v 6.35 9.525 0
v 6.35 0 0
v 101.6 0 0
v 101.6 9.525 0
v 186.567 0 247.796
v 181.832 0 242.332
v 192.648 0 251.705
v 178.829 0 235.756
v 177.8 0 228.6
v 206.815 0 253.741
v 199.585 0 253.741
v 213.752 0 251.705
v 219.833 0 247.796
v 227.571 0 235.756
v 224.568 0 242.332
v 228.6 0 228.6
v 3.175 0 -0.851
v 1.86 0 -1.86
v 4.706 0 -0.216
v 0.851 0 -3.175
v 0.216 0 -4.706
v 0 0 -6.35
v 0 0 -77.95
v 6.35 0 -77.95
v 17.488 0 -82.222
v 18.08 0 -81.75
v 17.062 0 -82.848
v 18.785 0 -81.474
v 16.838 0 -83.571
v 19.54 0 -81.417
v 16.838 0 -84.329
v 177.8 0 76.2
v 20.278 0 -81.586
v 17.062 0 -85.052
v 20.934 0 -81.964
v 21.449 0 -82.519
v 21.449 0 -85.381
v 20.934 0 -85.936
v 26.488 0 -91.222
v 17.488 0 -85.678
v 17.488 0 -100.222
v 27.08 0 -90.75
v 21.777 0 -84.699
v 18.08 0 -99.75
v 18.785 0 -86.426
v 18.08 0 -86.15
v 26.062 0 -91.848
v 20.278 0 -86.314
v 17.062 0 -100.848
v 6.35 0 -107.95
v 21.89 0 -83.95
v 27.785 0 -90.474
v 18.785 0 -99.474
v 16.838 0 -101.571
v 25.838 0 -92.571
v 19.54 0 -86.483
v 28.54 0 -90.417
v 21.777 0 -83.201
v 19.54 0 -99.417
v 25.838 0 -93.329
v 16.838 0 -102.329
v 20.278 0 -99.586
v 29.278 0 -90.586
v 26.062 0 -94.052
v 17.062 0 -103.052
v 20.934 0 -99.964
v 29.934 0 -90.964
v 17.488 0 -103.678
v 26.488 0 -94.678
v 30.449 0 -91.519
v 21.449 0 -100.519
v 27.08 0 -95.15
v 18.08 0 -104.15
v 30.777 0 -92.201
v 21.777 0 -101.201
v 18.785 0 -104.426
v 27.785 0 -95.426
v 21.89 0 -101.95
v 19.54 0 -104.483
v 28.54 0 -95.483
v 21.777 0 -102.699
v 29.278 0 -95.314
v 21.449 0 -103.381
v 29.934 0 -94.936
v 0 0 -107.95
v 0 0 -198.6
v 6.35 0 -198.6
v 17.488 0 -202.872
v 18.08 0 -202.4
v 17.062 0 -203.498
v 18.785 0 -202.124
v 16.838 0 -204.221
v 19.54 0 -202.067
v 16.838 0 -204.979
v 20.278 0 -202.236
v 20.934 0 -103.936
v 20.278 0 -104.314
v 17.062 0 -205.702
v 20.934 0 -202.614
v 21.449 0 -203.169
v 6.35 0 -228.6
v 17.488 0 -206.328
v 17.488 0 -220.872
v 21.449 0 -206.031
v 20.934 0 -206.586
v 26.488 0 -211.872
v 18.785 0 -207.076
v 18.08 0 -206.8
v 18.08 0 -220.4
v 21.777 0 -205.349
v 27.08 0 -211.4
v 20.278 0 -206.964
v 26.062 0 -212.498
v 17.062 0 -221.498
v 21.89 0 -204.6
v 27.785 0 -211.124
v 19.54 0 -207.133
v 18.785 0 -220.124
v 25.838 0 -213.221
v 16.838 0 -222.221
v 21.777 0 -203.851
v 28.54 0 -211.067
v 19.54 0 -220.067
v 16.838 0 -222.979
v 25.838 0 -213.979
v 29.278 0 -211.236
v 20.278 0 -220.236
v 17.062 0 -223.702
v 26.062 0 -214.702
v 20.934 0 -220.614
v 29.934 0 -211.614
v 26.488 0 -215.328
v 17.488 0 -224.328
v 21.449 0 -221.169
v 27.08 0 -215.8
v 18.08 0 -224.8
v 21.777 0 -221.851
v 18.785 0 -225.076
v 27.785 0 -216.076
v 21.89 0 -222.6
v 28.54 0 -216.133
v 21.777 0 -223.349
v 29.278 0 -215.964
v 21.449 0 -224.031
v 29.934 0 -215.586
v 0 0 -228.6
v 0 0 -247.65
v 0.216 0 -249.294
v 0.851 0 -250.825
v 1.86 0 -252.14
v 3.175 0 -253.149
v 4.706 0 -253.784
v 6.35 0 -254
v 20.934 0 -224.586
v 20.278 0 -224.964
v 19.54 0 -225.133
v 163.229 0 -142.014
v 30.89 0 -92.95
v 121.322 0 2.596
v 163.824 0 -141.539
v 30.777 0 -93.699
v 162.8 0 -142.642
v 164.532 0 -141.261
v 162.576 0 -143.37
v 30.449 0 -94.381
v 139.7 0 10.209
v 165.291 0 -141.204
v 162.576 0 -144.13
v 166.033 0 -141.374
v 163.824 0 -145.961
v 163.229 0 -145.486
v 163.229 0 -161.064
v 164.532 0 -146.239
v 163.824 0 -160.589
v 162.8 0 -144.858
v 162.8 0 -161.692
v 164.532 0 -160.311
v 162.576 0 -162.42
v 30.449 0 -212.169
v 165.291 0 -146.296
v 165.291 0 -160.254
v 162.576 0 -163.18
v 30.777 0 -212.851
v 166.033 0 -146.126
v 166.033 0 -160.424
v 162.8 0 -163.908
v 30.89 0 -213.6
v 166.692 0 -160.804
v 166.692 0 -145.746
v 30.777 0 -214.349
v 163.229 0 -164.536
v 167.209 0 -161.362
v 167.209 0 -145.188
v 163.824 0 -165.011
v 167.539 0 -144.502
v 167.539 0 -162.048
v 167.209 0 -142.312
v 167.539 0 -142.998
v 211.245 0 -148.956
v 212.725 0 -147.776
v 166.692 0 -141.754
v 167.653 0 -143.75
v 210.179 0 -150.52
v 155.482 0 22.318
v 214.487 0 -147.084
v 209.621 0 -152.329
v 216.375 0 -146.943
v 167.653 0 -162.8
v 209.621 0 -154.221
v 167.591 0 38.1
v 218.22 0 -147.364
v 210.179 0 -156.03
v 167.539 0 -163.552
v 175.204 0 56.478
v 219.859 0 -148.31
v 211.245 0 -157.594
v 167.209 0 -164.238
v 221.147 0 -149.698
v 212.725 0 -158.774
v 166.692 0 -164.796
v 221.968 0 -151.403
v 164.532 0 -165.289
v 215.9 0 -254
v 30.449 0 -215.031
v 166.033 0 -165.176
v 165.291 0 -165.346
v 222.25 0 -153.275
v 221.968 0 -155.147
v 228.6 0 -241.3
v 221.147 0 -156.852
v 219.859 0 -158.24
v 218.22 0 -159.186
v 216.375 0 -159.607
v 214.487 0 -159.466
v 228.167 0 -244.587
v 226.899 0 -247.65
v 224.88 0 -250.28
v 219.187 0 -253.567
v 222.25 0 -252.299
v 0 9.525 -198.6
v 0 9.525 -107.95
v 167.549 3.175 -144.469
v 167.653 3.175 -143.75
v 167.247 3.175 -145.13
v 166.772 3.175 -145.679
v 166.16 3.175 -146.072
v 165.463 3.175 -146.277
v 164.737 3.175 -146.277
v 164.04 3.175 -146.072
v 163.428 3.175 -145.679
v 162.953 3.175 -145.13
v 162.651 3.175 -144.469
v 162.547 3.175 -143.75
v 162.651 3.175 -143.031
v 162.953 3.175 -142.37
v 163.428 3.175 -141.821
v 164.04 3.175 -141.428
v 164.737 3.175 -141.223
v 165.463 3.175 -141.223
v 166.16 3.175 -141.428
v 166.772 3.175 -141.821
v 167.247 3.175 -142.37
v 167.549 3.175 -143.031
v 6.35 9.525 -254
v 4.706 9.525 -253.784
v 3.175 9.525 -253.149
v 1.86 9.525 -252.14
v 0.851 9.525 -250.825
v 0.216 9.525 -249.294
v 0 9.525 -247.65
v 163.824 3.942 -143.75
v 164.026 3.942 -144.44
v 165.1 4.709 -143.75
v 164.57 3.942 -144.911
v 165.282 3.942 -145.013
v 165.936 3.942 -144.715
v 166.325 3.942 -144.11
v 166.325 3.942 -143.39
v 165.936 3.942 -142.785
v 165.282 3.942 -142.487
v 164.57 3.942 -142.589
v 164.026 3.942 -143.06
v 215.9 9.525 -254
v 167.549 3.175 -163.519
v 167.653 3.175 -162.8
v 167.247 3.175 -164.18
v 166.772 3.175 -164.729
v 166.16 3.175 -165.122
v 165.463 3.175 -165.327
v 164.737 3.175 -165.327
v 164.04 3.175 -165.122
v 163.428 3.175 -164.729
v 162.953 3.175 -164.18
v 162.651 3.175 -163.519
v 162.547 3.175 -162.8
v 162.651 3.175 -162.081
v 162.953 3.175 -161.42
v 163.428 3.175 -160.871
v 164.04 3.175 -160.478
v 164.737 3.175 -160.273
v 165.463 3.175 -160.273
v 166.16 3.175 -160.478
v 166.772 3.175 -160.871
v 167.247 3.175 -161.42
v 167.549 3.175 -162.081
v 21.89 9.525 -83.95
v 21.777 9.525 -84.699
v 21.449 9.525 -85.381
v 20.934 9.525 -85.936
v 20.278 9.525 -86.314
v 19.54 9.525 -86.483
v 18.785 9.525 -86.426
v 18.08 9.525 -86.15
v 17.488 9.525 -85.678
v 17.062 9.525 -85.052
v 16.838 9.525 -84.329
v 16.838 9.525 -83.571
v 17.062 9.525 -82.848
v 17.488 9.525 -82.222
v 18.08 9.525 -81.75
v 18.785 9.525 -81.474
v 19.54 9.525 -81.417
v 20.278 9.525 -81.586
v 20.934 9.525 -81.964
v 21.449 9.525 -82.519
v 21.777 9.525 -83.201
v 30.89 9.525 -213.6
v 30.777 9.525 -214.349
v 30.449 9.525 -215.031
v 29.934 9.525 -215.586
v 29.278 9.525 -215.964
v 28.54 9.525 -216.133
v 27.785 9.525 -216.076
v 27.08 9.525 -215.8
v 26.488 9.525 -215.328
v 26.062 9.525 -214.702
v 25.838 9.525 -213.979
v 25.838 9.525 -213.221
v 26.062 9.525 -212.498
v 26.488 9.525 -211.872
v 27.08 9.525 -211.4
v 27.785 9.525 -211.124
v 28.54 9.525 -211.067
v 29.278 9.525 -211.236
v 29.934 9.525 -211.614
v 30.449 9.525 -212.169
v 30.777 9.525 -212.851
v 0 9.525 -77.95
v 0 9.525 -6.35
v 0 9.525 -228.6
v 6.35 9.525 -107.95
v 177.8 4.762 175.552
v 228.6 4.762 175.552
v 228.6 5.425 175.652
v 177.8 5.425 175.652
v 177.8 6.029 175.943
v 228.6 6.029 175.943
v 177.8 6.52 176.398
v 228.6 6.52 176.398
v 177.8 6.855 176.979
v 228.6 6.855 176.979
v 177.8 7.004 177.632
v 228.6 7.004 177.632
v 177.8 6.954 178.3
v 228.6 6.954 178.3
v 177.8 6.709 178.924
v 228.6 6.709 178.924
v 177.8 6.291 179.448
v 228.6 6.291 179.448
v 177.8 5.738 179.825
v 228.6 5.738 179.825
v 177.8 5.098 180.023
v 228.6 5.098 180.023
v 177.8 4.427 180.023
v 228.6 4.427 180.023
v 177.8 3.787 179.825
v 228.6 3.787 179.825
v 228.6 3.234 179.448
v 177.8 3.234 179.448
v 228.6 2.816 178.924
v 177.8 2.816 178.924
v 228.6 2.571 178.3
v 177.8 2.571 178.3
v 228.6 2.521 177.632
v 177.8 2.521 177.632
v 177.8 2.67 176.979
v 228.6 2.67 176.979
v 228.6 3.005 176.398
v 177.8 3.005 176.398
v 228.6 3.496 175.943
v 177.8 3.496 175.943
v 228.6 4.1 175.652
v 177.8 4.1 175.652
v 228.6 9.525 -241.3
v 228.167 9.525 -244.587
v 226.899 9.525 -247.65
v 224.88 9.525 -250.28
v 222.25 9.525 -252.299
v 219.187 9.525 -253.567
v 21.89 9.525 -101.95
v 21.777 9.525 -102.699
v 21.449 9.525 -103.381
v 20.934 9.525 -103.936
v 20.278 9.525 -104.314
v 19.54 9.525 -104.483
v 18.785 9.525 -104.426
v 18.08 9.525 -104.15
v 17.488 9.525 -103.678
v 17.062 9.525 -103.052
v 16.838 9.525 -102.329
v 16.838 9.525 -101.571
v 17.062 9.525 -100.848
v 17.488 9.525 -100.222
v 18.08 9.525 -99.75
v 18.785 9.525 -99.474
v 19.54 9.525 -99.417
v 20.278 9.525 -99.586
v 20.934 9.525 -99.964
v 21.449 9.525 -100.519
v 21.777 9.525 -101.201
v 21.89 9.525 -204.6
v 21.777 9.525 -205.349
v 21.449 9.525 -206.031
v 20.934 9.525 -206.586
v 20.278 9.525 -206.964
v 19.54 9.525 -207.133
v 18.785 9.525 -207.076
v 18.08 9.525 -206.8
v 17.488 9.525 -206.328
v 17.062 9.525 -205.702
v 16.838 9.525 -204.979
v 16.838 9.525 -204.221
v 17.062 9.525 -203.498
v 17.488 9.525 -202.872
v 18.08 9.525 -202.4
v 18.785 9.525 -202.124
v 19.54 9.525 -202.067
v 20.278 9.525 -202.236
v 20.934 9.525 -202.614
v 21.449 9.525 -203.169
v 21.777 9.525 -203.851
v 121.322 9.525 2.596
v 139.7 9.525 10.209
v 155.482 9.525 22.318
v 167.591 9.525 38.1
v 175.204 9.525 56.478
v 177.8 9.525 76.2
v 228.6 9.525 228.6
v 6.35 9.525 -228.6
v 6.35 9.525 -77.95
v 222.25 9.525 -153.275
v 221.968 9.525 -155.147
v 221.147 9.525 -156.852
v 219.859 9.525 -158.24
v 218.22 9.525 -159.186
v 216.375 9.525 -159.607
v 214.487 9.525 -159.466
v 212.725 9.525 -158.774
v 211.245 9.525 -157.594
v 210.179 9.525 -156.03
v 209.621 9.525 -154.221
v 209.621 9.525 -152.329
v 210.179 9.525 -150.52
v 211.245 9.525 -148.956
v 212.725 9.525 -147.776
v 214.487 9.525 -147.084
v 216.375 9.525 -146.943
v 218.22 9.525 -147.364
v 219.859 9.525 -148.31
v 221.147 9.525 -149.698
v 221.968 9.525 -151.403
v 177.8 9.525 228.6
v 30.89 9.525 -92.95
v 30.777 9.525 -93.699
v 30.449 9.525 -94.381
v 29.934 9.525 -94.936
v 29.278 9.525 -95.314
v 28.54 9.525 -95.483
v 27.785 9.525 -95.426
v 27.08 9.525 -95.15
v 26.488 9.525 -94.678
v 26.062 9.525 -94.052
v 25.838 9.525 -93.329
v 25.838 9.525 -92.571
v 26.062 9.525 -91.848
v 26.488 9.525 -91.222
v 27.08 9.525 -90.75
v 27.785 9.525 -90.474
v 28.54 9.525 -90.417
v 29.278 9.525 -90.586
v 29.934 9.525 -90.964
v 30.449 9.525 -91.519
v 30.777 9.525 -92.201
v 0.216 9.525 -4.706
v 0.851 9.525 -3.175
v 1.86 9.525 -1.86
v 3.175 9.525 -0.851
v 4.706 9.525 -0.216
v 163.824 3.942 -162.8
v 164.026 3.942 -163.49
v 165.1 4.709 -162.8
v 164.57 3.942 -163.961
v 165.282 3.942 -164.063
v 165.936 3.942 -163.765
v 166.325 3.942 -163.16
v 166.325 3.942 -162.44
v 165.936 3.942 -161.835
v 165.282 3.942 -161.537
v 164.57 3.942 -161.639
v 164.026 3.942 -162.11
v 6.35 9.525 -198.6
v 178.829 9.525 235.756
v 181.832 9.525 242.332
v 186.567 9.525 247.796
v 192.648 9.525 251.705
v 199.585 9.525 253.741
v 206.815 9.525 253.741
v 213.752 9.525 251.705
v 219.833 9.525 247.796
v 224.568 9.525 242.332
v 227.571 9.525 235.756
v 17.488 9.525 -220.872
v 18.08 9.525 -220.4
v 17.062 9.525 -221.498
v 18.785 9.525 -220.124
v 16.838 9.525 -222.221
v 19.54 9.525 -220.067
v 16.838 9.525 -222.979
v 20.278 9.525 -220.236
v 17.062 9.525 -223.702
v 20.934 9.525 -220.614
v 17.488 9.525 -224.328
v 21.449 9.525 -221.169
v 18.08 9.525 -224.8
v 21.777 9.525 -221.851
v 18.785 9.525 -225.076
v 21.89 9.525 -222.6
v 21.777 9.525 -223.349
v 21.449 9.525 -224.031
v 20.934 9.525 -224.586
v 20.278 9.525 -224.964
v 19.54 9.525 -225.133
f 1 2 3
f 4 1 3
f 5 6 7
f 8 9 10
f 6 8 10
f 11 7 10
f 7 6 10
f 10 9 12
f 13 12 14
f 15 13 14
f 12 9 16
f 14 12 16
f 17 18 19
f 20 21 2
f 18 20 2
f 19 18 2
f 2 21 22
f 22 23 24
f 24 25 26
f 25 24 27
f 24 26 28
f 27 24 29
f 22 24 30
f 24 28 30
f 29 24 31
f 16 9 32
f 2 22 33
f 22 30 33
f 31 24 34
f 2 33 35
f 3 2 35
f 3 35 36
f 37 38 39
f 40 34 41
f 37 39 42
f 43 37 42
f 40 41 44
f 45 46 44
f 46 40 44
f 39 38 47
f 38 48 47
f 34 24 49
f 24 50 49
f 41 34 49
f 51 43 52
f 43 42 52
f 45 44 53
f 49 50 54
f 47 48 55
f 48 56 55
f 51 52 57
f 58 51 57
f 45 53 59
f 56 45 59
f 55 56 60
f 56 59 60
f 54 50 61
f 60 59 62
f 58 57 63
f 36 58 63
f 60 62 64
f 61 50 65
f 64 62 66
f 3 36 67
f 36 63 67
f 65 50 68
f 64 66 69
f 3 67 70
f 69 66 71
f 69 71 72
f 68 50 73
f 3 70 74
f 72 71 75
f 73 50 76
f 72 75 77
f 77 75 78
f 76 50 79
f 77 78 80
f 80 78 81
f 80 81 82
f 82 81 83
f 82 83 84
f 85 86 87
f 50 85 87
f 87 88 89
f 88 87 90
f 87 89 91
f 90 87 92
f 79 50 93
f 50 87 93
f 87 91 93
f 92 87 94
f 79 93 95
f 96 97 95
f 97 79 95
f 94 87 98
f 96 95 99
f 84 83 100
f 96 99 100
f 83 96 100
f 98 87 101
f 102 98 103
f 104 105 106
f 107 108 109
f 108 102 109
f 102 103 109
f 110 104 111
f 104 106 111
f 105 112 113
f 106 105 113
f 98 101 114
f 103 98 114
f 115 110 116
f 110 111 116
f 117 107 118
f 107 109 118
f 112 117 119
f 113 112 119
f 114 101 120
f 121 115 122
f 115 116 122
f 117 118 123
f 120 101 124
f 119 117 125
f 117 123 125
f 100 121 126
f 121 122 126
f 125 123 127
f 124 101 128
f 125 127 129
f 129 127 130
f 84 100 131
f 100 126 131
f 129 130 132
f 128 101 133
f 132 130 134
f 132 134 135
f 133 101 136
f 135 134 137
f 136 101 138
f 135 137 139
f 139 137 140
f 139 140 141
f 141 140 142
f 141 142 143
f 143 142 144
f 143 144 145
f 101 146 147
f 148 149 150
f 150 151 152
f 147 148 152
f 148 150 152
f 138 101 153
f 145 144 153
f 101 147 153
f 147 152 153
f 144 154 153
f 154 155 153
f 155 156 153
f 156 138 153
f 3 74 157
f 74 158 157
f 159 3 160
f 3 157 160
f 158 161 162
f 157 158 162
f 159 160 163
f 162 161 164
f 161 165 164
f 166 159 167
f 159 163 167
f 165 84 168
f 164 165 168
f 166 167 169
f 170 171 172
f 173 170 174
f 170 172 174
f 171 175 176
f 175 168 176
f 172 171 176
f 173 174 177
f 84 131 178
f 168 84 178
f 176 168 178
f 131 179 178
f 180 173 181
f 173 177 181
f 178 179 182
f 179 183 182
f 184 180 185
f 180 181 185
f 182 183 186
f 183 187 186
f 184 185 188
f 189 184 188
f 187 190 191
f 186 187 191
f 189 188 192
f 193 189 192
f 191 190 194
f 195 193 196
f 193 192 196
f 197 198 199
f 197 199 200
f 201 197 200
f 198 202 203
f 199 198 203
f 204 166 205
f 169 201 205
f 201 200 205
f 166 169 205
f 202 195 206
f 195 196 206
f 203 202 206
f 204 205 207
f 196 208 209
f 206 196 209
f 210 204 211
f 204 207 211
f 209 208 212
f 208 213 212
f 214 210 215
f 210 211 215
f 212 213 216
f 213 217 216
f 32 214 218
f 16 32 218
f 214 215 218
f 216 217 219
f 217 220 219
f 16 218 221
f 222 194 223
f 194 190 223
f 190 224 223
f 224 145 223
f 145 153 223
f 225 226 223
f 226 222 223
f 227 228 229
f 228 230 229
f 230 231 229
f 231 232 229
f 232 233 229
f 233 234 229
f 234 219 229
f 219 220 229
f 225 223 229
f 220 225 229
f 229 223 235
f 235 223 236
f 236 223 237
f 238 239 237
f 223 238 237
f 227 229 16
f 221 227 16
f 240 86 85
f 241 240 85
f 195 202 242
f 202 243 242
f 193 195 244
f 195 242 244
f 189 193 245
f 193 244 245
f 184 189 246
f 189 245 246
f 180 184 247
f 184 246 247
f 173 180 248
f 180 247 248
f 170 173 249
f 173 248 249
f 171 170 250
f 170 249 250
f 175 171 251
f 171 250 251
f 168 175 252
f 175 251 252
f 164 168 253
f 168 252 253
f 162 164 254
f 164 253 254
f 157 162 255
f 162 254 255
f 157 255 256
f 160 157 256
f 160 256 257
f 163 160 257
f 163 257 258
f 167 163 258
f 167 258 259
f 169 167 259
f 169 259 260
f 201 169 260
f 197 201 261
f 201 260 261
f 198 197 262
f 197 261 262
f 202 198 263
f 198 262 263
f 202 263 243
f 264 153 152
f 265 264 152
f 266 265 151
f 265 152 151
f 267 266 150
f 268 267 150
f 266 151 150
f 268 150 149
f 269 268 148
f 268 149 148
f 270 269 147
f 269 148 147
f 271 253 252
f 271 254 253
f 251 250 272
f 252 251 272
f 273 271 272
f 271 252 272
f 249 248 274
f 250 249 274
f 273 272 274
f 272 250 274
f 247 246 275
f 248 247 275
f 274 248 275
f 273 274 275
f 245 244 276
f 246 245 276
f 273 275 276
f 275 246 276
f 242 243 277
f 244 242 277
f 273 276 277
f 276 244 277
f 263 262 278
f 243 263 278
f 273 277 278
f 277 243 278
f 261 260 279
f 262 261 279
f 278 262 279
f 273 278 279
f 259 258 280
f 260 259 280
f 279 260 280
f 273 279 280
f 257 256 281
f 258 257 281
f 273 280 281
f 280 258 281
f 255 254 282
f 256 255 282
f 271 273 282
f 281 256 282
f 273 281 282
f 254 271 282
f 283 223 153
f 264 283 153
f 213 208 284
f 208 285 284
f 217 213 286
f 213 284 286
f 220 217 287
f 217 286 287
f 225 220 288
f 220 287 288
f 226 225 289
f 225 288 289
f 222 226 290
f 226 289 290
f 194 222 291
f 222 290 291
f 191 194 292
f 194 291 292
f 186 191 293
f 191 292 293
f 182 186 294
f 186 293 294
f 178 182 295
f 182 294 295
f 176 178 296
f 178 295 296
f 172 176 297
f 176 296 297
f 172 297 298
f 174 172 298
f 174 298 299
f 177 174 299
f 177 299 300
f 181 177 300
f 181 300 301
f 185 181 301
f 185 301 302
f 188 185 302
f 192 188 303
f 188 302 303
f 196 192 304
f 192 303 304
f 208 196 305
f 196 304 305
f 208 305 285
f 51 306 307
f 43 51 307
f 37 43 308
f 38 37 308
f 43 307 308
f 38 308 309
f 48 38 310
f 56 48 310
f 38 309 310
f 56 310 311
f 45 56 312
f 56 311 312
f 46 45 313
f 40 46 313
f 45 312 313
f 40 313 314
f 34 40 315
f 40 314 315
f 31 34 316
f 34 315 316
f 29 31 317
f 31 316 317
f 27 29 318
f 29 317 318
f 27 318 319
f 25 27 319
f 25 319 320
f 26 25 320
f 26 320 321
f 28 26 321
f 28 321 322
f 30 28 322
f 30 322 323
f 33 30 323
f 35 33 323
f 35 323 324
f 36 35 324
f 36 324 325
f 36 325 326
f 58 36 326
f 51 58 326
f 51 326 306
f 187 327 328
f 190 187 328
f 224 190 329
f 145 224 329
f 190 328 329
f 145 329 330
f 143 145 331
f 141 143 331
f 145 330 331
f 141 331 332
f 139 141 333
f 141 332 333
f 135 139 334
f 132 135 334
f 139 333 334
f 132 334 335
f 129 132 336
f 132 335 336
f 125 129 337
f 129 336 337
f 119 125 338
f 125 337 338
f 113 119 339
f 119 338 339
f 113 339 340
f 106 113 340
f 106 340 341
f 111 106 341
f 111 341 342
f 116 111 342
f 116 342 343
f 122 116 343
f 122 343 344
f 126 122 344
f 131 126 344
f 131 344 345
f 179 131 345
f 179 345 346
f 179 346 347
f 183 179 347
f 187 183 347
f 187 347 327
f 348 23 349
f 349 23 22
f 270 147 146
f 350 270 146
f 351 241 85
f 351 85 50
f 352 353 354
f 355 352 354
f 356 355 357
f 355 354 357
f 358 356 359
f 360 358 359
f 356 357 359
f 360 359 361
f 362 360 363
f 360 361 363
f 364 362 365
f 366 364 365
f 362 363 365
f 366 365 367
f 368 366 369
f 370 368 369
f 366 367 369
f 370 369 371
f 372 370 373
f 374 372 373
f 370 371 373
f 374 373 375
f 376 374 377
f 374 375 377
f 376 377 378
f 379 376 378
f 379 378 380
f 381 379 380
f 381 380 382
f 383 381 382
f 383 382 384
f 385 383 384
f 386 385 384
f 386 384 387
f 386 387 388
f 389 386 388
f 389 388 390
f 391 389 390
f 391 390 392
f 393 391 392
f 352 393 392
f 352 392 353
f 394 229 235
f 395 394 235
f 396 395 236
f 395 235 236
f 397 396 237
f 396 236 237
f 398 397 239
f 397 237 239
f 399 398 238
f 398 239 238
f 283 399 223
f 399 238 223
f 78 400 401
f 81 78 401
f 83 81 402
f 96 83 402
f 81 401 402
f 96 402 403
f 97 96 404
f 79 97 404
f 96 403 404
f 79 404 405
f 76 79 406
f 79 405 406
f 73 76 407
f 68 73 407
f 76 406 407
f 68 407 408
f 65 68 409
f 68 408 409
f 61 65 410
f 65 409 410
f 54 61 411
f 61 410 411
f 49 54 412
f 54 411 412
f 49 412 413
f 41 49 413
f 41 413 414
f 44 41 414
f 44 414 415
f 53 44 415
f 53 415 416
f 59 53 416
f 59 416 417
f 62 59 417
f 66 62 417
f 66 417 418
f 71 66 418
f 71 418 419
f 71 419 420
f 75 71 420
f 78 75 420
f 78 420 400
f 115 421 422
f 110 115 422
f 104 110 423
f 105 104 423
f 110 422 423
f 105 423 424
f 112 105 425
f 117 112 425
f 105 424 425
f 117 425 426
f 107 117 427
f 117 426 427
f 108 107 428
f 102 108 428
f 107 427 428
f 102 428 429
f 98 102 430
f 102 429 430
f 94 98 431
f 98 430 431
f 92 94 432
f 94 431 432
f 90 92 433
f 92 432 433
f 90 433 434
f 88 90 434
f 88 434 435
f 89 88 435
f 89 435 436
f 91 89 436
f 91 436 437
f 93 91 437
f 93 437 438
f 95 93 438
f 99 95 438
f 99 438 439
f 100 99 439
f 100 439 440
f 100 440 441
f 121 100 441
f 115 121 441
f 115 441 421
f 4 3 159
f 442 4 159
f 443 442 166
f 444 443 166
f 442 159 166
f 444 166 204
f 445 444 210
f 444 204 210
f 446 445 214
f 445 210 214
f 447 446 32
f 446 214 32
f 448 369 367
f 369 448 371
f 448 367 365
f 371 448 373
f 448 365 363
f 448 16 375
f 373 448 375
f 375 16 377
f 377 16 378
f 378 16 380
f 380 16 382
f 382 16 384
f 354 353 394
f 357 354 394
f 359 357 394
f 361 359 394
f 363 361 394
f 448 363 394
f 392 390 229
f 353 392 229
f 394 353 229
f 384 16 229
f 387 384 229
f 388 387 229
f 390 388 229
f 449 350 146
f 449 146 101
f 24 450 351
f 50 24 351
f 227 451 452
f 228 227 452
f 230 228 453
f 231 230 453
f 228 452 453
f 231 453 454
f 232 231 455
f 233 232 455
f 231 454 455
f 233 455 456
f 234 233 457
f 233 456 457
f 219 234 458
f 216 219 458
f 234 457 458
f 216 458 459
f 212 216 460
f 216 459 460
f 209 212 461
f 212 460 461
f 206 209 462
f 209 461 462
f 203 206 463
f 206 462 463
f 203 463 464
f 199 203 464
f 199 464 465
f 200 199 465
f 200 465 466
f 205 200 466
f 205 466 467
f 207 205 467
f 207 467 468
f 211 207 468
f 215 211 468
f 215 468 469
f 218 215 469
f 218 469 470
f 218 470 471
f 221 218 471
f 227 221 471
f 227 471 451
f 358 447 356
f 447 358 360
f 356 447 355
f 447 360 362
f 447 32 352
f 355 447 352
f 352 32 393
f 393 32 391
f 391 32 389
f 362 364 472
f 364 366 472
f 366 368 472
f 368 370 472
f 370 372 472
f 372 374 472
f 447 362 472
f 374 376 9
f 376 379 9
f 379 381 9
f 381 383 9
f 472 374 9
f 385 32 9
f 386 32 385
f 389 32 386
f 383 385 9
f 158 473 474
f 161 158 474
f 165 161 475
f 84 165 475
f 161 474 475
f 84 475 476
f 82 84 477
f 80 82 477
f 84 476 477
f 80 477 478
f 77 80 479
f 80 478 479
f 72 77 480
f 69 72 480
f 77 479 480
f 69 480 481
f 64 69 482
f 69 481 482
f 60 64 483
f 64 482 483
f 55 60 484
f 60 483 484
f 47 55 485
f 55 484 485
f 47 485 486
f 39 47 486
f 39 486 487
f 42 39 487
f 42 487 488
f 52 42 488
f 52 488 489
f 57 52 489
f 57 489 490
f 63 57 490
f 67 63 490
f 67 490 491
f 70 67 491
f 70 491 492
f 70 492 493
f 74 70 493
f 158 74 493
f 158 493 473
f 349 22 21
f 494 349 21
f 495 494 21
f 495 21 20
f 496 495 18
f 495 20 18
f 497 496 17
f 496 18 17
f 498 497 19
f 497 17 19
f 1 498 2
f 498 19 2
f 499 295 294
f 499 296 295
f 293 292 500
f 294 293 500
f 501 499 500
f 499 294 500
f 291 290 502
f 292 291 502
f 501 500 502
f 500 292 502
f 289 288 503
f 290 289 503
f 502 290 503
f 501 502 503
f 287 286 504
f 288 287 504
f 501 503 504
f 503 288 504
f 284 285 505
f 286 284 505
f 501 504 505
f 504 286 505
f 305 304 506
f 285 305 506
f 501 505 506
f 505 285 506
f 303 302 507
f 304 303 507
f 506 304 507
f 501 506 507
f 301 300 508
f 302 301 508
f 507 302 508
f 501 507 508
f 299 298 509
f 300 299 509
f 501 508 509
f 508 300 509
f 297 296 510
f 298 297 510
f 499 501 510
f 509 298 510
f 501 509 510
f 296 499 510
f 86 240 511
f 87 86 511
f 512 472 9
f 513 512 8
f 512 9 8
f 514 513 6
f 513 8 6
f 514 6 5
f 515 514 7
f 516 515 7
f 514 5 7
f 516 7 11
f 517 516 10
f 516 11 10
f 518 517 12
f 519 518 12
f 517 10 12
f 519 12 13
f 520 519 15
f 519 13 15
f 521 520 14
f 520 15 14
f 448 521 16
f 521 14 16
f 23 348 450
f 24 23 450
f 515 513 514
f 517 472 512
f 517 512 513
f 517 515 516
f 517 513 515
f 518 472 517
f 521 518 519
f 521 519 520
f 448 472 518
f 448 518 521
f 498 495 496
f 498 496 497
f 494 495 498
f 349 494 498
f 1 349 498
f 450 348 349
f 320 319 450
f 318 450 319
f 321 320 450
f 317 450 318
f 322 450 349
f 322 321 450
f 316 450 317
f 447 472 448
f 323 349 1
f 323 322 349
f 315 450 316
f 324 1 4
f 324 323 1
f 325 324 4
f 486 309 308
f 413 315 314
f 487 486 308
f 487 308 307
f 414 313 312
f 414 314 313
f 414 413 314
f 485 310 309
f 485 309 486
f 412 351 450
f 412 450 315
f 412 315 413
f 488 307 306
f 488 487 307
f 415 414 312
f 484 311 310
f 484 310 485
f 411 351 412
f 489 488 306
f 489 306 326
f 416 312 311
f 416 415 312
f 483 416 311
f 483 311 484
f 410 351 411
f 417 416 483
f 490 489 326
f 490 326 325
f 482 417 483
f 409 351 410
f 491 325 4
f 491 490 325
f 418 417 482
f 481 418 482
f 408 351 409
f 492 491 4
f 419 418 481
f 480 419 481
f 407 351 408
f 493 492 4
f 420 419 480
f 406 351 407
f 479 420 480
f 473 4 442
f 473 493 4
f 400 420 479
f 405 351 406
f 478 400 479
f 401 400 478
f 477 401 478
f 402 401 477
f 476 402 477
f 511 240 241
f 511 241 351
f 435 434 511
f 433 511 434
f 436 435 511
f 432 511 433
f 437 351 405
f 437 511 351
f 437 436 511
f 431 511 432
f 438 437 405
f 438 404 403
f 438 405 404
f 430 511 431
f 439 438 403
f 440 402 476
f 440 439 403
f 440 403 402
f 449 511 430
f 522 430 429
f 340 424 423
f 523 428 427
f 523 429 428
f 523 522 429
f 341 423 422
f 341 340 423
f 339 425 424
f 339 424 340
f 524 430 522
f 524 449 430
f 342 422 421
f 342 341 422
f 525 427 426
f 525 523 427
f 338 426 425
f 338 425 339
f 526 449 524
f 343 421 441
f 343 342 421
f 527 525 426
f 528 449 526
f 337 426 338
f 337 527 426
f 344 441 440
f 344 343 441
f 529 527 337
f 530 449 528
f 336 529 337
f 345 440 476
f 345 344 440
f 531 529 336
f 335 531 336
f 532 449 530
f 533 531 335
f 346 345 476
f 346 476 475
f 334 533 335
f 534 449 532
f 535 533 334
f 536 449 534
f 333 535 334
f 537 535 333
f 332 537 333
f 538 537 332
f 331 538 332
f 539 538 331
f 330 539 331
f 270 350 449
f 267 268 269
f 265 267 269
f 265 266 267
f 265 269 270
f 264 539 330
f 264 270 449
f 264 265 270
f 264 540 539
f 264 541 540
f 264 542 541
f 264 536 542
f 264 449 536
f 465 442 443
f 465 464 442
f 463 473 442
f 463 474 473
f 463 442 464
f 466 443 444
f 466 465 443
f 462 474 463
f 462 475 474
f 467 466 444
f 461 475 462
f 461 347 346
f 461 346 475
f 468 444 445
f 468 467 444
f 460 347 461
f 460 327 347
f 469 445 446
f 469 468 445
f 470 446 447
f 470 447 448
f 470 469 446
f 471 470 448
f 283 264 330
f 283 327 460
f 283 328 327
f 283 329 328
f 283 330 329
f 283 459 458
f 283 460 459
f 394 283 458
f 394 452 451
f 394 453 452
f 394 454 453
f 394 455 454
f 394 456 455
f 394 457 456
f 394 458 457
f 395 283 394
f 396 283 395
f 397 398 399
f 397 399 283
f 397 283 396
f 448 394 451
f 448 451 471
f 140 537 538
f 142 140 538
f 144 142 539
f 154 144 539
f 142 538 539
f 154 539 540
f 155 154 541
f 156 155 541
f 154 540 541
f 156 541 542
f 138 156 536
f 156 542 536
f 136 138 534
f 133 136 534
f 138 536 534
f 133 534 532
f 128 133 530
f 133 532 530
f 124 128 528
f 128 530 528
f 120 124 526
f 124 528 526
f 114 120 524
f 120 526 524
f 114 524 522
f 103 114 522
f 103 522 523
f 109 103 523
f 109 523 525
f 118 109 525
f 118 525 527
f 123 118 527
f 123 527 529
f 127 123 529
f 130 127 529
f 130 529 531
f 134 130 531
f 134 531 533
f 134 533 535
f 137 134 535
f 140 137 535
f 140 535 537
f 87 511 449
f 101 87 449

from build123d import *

# Parameters (mm, degrees)
BOSS_EXTRUDE1_DEPTH            = 9.525
CUT_EXTRUDE1_REACH             = 11.525
SKETCH2_R                      = 2.54
SKETCH2_W                      = 6.35
SKETCH2_H                      = 30
CUT_EXTRUDE2_REACH             = 230.6
SKETCH3_R                      = 2.2479
F_7_0_201_DIAMETER_HOLE1_D     = 5.1054
F_7_0_201_DIAMETER_HOLE1_DEPTH = 3.175
F_7_0_201_DIAMETER_HOLE1_TIP   = 1.533816902
SKETCH7_R                      = 6.35
CUT_EXTRUDE3_DEPTH             = 10.525


with BuildPart() as part:
    # Sketch1 → Boss-Extrude1 (new body)
    with BuildSketch(Plane(origin=(0, 0, 0), x_dir=(1, 0, 0), z_dir=(0, 1, 0))):
        with BuildLine():
            Line((6.35, 0), (101.6, 0))
            ThreePointArc((101.6, 0), (155.481536726, -22.318463274), (177.8, -76.2))
            Line((177.8, -76.2), (177.8, -228.6))
            ThreePointArc((177.8, -228.6), (203.2, -254), (228.6, -228.6))
            Line((228.6, -228.6), (228.6, 241.3))
            ThreePointArc((228.6, 241.3), (224.880256121, 250.280256121), (215.9, 254))
            Line((215.9, 254), (6.35, 254))
            ThreePointArc((6.35, 254), (1.859871939, 252.140128061), (0, 247.65))
            Line((0, 247.65), (0, 6.35))
            ThreePointArc((0, 6.35), (1.859871939, 1.859871939), (6.35, 0))
        make_face()
    extrude(amount=BOSS_EXTRUDE1_DEPTH)

    # Sketch2 → Cut-Extrude1 (cut, up to next)
    with BuildSketch(Plane(origin=(0, 9.525, 0), x_dir=(1, 0, 0), z_dir=(0, 1, 0)), mode=Mode.PRIVATE) as cut_extrude1_sk1:
        with Locations((28.34999918, 213.6)):
            Circle(SKETCH2_R)
    cut_extrude1_tool1 = extrude(cut_extrude1_sk1.sketch, amount=-CUT_EXTRUDE1_REACH, mode=Mode.PRIVATE) & part.part
    add(cut_extrude1_tool1.solids().sort_by_distance((28.349999, 9.525, -213.6))[0], mode=Mode.SUBTRACT)
    # Sketch2 → Cut-Extrude1 (cut, up to next)
    with BuildSketch(Plane(origin=(0, 9.525, 0), x_dir=(1, 0, 0), z_dir=(0, 1, 0)), mode=Mode.PRIVATE) as cut_extrude1_sk2:
        with Locations((19.3499994, 222.59999978)):
            Circle(SKETCH2_R)
    cut_extrude1_tool2 = extrude(cut_extrude1_sk2.sketch, amount=-CUT_EXTRUDE1_REACH, mode=Mode.PRIVATE) & part.part
    add(cut_extrude1_tool2.solids().sort_by_distance((19.349999, 9.525, -222.6))[0], mode=Mode.SUBTRACT)
    # Sketch2 → Cut-Extrude1 (cut, up to next)
    with BuildSketch(Plane(origin=(0, 9.525, 0), x_dir=(1, 0, 0), z_dir=(0, 1, 0)), mode=Mode.PRIVATE) as cut_extrude1_sk3:
        with Locations((19.3499994, 204.60000022)):
            Circle(SKETCH2_R)
    cut_extrude1_tool3 = extrude(cut_extrude1_sk3.sketch, amount=-CUT_EXTRUDE1_REACH, mode=Mode.PRIVATE) & part.part
    add(cut_extrude1_tool3.solids().sort_by_distance((19.349999, 9.525, -204.6))[0], mode=Mode.SUBTRACT)
    # Sketch2 → Cut-Extrude1 (cut, up to next)
    with BuildSketch(Plane(origin=(0, 9.525, 0), x_dir=(1, 0, 0), z_dir=(0, 1, 0)), mode=Mode.PRIVATE) as cut_extrude1_sk4:
        with Locations((28.34999918, 92.95)):
            Circle(SKETCH2_R)
    cut_extrude1_tool4 = extrude(cut_extrude1_sk4.sketch, amount=-CUT_EXTRUDE1_REACH, mode=Mode.PRIVATE) & part.part
    add(cut_extrude1_tool4.solids().sort_by_distance((28.349999, 9.525, -92.95))[0], mode=Mode.SUBTRACT)
    # Sketch2 → Cut-Extrude1 (cut, up to next)
    with BuildSketch(Plane(origin=(0, 9.525, 0), x_dir=(1, 0, 0), z_dir=(0, 1, 0)), mode=Mode.PRIVATE) as cut_extrude1_sk5:
        with Locations((19.3499994, 101.94999978)):
            Circle(SKETCH2_R)
    cut_extrude1_tool5 = extrude(cut_extrude1_sk5.sketch, amount=-CUT_EXTRUDE1_REACH, mode=Mode.PRIVATE) & part.part
    add(cut_extrude1_tool5.solids().sort_by_distance((19.349999, 9.525, -101.95))[0], mode=Mode.SUBTRACT)
    # Sketch2 → Cut-Extrude1 (cut, up to next)
    with BuildSketch(Plane(origin=(0, 9.525, 0), x_dir=(1, 0, 0), z_dir=(0, 1, 0)), mode=Mode.PRIVATE) as cut_extrude1_sk6:
        with Locations((19.3499994, 83.95000022)):
            Circle(SKETCH2_R)
    cut_extrude1_tool6 = extrude(cut_extrude1_sk6.sketch, amount=-CUT_EXTRUDE1_REACH, mode=Mode.PRIVATE) & part.part
    add(cut_extrude1_tool6.solids().sort_by_distance((19.349999, 9.525, -83.95))[0], mode=Mode.SUBTRACT)
    # Sketch2 → Cut-Extrude1 (cut, up to next)
    with BuildSketch(Plane(origin=(0, 9.525, 0), x_dir=(1, 0, 0), z_dir=(0, 1, 0)), mode=Mode.PRIVATE) as cut_extrude1_sk7:
        with Locations((3.175, 213.6)):
            Rectangle(SKETCH2_W, SKETCH2_H)
    cut_extrude1_tool7 = extrude(cut_extrude1_sk7.sketch, amount=-CUT_EXTRUDE1_REACH, mode=Mode.PRIVATE) & part.part
    add(cut_extrude1_tool7.solids().sort_by_distance((3.175, 9.525, -213.6))[0], mode=Mode.SUBTRACT)
    # Sketch2 → Cut-Extrude1 (cut, up to next)
    with BuildSketch(Plane(origin=(0, 9.525, 0), x_dir=(1, 0, 0), z_dir=(0, 1, 0)), mode=Mode.PRIVATE) as cut_extrude1_sk8:
        with Locations((3.175, 92.95)):
            Rectangle(SKETCH2_W, SKETCH2_H)
    cut_extrude1_tool8 = extrude(cut_extrude1_sk8.sketch, amount=-CUT_EXTRUDE1_REACH, mode=Mode.PRIVATE) & part.part
    add(cut_extrude1_tool8.solids().sort_by_distance((3.175, 9.525, -92.95))[0], mode=Mode.SUBTRACT)

    # Sketch3 → Cut-Extrude2 (cut, up to next)
    with BuildSketch(Plane(origin=(228.6, 0, 0), x_dir=(0, 0, -1), z_dir=(1, 0, 0)), mode=Mode.PRIVATE) as cut_extrude2_sk1:
        with Locations((-177.8, 4.7625)):
            Circle(SKETCH3_R)
    cut_extrude2_tool1 = extrude(cut_extrude2_sk1.sketch, amount=-CUT_EXTRUDE2_REACH, mode=Mode.PRIVATE) & part.part
    add(cut_extrude2_tool1.solids().sort_by_distance((228.6, 4.7625, 177.8))[0], mode=Mode.SUBTRACT)

    # #7 (0.201) Diameter Hole1
    with Locations(Plane(origin=(0, 0, 0), x_dir=(-1, 0, 0), z_dir=(0, -1, 0))):
        with Locations((-165.1, 143.75), (-165.1, 162.8)):
            Hole(F_7_0_201_DIAMETER_HOLE1_D / 2, depth=F_7_0_201_DIAMETER_HOLE1_DEPTH)
            with Locations((0, 0, -(F_7_0_201_DIAMETER_HOLE1_DEPTH + F_7_0_201_DIAMETER_HOLE1_TIP / 2))):  # 118° drill point
                Cone(0, F_7_0_201_DIAMETER_HOLE1_D / 2, F_7_0_201_DIAMETER_HOLE1_TIP, mode=Mode.SUBTRACT)

    # Sketch7 → Cut-Extrude3 (cut, through all)
    with BuildSketch(Plane(origin=(0, 9.525, 0), x_dir=(1, 0, 0), z_dir=(0, 1, 0))):
        with Locations((215.9, 153.275)):
            Circle(SKETCH7_R)
    extrude(amount=-CUT_EXTRUDE3_DEPTH, mode=Mode.SUBTRACT)


solid = part.part
